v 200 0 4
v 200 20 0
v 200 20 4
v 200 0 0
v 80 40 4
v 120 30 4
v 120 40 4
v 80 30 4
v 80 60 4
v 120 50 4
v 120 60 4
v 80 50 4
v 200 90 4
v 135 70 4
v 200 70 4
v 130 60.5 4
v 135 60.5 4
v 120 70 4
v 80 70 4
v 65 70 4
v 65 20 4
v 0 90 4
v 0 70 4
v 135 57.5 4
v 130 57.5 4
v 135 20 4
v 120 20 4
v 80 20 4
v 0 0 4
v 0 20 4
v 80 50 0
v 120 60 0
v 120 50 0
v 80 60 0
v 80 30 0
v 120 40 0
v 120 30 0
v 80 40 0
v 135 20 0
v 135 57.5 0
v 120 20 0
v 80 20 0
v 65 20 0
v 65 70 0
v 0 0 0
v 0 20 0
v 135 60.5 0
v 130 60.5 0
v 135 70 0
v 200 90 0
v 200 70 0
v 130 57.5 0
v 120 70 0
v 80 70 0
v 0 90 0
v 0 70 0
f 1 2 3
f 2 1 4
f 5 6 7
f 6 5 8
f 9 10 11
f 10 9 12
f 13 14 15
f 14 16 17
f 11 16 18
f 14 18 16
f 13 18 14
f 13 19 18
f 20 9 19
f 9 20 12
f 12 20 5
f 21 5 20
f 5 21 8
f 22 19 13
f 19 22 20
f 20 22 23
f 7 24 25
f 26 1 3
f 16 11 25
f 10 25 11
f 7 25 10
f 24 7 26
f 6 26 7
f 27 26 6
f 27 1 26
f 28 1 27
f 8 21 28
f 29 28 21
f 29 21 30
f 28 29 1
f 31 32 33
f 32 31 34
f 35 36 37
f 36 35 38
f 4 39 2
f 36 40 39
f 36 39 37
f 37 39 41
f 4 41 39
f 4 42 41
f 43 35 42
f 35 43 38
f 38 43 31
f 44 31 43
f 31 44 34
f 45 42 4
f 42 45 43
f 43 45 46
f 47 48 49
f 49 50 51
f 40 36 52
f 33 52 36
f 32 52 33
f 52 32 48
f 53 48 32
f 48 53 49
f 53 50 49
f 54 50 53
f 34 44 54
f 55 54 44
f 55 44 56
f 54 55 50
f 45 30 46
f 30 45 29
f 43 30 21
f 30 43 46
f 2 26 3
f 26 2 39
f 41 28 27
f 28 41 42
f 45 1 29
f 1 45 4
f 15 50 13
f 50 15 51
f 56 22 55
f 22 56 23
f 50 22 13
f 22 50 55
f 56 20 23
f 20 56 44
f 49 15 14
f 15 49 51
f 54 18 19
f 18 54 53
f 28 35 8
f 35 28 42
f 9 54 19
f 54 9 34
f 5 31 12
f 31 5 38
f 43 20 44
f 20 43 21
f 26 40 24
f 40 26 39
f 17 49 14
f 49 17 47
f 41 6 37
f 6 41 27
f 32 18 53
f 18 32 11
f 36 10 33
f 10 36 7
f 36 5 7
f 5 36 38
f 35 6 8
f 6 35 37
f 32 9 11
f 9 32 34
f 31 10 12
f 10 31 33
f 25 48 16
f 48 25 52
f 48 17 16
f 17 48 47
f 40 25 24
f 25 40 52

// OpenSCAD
Thickness=4; // z height, determines the sturdiness 
MainBodyLength=200; // 
MainBodyWidth=90; // wires are wrapped around this axis
ExteriorArmWidth=20;
InteriorArmSpacing=70; // how much you HAVE to wrap cord around
InteriorArmWidth=15;
NotchDepth=5;
VaryNotchPosition=0;
NumberCenterSupports=2; 
CenterSupportWidth=10;


module ExteriorArms(){
    union(){
        cube(([MainBodyLength,ExteriorArmWidth,Thickness]));
        translate([0, ((MainBodyWidth)-(ExteriorArmWidth)) ,0])
        cube(([MainBodyLength,ExteriorArmWidth,Thickness]));
    }
}

module InteriorArms(){
    union(){
        cube(([InteriorArmWidth,MainBodyWidth,Thickness]));
        translate([((InteriorArmSpacing)-(InteriorArmWidth)),0,0])
        cube(([InteriorArmWidth,MainBodyWidth,Thickness]));       
    }
}

module CenterSupports(){
    
    union(){
        cube(([0,0,0]));
        translate([0,0,0])
        cube(([0,0,0]));       
    }
    
}


module MainBody(){
    union(){
        ExteriorArms();
        translate([(MainBodyLength/2)-(InteriorArmSpacing/2),0,0])
        InteriorArms();
    }
    for (i=[0:NumberCenterSupports-1]){
        translate([(MainBodyLength/2)-(InteriorArmSpacing/2)*0.99, ((ExteriorArmWidth)-(CenterSupportWidth/2)) + (i+1)*(((MainBodyWidth-(2*ExteriorArmWidth))+ CenterSupportWidth)/(NumberCenterSupports+1)) - (CenterSupportWidth/2)  ,0])
        cube(([InteriorArmSpacing*0.99,CenterSupportWidth,Thickness]));
    
    }
}

module Notch(){
    cube(([100,3,100]));
}

difference(){
    MainBody();
    translate([(MainBodyLength/2)+(InteriorArmSpacing/2)-NotchDepth,MainBodyWidth-ExteriorArmWidth-( (MainBodyWidth-(2*ExteriorArmWidth))/4)+VaryNotchPosition,-0.50])
    Notch();
}
